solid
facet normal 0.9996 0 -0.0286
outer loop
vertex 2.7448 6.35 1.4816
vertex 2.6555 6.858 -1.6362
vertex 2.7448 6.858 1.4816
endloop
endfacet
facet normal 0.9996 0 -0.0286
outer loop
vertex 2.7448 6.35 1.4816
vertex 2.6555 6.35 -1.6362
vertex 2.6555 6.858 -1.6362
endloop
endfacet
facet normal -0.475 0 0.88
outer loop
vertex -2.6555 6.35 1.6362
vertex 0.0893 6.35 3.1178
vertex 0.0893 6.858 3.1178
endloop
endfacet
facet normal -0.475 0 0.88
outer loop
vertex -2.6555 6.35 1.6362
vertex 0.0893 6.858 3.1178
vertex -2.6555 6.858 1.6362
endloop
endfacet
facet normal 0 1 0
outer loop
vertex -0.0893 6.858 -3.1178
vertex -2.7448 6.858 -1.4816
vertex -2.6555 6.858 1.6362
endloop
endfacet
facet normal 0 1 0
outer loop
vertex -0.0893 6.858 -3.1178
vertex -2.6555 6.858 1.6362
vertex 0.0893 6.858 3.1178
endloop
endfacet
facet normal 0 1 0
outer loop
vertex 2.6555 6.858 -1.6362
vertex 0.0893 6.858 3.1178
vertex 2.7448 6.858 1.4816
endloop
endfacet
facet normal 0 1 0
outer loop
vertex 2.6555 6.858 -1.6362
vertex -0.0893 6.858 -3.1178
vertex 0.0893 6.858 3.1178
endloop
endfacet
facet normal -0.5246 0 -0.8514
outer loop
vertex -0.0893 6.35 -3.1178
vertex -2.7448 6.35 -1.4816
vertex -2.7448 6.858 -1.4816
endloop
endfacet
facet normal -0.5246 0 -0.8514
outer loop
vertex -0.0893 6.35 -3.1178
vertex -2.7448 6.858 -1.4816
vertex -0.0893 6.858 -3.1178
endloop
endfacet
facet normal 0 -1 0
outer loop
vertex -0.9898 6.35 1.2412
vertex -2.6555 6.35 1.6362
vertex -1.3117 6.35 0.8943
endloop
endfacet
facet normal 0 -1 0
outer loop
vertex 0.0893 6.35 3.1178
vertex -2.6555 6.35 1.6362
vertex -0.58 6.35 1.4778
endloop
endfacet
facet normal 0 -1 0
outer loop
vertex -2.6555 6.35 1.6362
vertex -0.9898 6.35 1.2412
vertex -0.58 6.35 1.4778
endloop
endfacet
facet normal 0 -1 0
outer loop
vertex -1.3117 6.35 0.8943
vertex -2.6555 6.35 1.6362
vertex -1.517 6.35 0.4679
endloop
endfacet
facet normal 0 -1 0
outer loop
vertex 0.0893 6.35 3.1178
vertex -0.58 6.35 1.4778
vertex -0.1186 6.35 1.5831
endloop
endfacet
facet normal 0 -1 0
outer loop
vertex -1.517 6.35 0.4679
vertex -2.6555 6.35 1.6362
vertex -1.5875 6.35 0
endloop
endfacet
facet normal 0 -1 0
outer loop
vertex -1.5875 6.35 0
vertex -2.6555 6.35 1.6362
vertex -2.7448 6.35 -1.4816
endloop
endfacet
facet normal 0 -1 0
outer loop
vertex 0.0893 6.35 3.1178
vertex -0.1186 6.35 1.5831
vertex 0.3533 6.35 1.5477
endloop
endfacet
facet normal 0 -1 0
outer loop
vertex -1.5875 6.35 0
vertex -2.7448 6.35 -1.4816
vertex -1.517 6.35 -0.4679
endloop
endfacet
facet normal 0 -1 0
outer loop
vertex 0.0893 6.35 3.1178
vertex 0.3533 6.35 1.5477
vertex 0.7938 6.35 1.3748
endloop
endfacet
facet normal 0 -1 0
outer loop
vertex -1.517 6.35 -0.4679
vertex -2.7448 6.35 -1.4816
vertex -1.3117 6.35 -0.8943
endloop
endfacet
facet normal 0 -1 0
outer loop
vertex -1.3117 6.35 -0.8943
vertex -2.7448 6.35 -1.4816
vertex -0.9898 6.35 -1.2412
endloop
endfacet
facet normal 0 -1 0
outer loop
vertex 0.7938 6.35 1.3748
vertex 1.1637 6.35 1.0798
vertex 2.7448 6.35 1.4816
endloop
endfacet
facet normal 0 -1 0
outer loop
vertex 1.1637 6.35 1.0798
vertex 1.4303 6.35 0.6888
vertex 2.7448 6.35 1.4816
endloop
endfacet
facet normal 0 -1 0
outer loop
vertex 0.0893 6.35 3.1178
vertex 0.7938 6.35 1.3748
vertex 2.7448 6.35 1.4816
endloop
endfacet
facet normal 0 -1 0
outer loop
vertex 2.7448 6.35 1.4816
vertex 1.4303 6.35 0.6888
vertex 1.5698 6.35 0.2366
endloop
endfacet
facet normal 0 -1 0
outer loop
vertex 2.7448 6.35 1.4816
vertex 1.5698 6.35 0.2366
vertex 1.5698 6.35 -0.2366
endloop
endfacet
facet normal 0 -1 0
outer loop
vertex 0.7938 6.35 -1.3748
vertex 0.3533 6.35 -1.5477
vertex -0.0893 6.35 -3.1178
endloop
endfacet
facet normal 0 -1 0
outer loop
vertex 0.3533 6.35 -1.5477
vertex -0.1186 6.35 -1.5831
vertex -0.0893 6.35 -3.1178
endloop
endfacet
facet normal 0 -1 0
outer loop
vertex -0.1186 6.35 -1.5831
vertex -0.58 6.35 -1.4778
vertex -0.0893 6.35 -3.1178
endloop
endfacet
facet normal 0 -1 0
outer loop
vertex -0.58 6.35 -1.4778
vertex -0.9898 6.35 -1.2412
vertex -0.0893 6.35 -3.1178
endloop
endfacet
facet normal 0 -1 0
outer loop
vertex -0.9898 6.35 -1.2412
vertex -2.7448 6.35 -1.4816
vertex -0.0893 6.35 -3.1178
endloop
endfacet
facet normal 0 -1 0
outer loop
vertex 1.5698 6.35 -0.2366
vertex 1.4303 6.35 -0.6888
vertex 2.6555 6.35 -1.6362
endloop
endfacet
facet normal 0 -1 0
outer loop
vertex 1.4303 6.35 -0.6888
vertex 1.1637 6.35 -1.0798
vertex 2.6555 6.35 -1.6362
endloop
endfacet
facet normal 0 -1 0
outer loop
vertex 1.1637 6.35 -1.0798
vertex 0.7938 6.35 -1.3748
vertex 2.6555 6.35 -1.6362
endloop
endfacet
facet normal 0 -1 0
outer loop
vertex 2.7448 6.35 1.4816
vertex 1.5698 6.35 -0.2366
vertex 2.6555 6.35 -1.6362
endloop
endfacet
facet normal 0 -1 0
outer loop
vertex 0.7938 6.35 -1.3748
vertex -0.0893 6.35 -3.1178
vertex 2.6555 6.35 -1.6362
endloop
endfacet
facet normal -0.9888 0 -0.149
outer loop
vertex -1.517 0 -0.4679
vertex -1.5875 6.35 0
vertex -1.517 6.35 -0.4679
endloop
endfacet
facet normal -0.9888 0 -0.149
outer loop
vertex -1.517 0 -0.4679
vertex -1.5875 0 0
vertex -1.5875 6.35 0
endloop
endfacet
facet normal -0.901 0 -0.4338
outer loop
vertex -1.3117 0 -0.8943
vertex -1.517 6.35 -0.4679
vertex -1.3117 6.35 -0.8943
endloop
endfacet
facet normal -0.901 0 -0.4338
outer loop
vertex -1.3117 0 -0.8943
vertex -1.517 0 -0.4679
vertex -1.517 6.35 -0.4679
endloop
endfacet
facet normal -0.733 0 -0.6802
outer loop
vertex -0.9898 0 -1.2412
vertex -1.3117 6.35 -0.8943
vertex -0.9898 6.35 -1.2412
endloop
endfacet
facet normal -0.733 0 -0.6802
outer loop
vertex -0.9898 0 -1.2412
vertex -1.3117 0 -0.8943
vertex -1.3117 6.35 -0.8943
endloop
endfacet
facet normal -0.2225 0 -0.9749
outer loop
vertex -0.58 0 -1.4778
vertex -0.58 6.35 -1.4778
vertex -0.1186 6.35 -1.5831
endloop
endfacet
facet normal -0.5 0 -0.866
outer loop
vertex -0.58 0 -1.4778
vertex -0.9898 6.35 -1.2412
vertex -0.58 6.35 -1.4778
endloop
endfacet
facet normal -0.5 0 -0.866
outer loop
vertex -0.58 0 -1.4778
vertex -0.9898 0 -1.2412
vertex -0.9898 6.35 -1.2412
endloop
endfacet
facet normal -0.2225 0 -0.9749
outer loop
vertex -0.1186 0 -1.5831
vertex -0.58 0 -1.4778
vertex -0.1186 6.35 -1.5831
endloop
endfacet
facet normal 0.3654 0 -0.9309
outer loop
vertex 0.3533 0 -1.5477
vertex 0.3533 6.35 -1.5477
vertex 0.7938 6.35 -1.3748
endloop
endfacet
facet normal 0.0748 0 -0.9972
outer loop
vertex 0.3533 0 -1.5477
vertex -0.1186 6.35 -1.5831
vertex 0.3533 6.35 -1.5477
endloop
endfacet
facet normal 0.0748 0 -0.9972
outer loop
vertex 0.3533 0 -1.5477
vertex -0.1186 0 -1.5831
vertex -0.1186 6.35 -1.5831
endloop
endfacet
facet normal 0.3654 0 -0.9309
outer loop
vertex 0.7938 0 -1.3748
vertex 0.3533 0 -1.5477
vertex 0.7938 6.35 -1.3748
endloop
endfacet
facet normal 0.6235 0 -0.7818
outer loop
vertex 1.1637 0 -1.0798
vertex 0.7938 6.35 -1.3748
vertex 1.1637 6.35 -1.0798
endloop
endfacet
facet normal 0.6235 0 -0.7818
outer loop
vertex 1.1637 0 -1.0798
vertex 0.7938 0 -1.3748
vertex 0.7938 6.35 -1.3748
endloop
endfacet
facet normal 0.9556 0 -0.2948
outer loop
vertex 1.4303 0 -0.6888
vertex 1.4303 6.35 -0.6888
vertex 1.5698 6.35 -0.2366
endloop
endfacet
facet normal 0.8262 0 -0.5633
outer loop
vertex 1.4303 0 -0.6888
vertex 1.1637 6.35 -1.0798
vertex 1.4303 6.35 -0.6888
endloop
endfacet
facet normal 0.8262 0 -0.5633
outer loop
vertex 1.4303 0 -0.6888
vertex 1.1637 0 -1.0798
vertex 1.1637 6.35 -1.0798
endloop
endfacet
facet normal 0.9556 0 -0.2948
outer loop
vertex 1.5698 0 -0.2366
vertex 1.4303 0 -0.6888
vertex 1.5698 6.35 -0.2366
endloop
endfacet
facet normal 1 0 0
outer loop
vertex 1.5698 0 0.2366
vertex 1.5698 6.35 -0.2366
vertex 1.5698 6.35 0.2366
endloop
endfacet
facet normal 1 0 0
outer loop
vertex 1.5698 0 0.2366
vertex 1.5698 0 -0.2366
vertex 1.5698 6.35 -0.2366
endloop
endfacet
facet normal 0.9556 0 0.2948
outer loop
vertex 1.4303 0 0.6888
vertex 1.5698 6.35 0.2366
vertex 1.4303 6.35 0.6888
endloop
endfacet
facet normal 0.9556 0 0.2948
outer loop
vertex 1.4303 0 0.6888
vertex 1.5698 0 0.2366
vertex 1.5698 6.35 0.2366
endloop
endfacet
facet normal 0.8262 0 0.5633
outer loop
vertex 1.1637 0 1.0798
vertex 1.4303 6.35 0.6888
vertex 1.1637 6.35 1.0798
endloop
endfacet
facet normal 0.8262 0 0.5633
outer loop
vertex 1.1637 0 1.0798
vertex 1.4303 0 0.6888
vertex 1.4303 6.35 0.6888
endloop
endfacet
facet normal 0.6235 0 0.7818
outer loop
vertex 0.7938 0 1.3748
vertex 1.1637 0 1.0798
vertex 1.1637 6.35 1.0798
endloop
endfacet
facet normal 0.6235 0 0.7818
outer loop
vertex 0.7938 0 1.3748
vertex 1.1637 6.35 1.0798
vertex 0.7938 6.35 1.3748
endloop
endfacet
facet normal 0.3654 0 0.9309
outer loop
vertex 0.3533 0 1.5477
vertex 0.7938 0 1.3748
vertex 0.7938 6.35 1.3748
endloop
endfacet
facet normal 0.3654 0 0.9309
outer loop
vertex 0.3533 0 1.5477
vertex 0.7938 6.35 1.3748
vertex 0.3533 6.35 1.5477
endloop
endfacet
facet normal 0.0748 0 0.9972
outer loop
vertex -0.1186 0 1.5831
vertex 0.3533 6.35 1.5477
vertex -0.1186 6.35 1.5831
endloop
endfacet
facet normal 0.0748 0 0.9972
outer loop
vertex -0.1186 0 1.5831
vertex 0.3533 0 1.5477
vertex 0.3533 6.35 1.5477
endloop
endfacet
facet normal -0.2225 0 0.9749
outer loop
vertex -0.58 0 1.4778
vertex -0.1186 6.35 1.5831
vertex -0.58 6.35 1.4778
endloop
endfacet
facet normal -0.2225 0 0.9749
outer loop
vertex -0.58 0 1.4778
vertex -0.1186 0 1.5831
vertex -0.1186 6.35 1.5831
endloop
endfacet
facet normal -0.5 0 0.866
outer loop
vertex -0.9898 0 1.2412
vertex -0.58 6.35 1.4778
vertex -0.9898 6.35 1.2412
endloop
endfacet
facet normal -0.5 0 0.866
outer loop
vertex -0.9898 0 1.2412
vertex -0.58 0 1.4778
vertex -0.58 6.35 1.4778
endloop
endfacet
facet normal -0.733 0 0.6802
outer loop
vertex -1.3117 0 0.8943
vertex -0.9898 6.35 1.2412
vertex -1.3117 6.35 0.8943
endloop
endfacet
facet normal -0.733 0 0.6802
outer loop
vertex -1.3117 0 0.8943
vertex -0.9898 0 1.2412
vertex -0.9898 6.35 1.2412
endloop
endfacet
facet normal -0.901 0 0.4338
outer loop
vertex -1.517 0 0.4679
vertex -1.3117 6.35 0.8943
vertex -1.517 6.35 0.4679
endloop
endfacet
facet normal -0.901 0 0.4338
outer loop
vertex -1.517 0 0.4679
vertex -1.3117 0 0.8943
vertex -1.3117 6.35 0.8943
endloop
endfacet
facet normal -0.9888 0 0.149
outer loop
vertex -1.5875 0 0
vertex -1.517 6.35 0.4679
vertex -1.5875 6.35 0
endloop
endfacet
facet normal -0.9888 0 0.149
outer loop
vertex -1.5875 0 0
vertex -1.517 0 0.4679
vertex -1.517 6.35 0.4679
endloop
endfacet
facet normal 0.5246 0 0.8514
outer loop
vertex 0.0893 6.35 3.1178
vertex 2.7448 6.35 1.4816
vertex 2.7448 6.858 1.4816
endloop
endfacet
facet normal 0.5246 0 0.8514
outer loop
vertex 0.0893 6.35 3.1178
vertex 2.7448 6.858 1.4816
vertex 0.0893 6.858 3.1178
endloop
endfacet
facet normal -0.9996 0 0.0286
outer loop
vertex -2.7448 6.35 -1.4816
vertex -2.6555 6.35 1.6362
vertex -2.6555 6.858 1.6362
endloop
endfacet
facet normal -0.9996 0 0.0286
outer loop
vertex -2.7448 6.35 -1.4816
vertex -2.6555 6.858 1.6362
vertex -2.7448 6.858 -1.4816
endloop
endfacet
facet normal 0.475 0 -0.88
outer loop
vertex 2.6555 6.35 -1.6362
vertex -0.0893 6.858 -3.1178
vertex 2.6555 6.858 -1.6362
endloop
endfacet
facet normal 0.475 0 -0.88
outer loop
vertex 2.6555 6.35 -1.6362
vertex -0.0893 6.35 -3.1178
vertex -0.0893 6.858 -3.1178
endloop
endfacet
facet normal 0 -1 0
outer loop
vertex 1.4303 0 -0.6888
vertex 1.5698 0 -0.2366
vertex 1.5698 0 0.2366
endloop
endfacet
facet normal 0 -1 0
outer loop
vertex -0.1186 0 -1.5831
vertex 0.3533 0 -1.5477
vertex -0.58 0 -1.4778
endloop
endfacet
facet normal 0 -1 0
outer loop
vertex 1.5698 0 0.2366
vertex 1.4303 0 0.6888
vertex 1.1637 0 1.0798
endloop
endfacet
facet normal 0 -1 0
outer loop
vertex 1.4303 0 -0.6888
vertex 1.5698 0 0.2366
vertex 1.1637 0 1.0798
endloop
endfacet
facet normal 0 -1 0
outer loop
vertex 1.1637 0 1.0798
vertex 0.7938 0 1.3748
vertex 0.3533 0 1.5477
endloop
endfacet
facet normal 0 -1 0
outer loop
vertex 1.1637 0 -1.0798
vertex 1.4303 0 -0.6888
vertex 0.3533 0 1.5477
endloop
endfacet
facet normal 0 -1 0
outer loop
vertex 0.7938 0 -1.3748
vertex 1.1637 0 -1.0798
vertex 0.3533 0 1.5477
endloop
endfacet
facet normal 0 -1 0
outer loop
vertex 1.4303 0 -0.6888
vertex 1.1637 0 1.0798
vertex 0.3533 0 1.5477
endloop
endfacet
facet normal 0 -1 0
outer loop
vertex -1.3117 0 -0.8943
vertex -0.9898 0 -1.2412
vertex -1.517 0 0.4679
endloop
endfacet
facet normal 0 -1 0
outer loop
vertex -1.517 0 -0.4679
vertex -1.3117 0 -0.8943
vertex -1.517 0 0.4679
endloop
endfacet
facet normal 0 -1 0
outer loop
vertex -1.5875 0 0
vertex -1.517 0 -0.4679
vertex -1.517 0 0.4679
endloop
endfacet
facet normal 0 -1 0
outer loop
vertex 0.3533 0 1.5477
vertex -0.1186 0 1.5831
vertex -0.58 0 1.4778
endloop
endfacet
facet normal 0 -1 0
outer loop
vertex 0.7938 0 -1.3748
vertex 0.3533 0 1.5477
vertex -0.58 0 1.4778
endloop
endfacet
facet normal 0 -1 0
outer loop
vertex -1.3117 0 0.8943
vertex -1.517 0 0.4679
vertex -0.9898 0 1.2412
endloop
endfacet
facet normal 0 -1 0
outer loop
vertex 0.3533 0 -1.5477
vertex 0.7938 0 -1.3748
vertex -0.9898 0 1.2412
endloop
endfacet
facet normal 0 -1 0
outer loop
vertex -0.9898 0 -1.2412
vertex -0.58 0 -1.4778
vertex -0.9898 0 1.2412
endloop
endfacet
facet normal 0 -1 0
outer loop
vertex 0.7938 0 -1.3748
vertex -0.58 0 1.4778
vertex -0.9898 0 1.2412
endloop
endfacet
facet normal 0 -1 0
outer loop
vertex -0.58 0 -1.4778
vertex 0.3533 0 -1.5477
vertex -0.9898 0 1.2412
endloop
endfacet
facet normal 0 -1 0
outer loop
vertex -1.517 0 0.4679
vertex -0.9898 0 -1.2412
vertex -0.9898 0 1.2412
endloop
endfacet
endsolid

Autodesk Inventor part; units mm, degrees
ref_plane "YZ Plane" through (0, 0, 0) normal (1, 0, 0) x (0, 1, 0)
ref_plane "XZ Plane" through (0, 0, 0) normal (0, 1, 0) x (-1, 0, 0)
ref_plane "XY Plane" through (0, 0, 0) normal (0, 0, 1) x (1, 0, 0)
sketch "Sketch1" plane through (0, 0, 0) normal (0, 1, 0) x (-1, 0, 0)
  circle A0 centre (0, 0) radius 6.35
  circle A1 centre (0, 0) radius 1.5875
  dimension "d0" = 12.7
  dimension "d1" = 3.175
extrude "Extrusion1" add sketch "Sketch1" along normal blind 6.35 contours A1
thread "Thread1" size "5-40 UNC" class "2A" standard "ANSI Unified Screw Threads" full length
sketch "Sketch3" plane through (0, 6.35, 0) normal (0, 1, 0) x (1, 0, 0)
  line L0 (-2.6555, -1.6362) -> (-2.7448, 1.4816)
  line L1 (-2.7448, 1.4816) -> (-0.0893, 3.1178)
  line L2 (-0.0893, 3.1178) -> (2.6555, 1.6362)
  line L3 (2.6555, 1.6362) -> (2.7448, -1.4816)
  line L4 (2.7448, -1.4816) -> (0.0893, -3.1178)
  line L5 (0.0893, -3.1178) -> (-2.6555, -1.6362)
  point P0 (0, 0)
  point P1 (0, 0)
extrude "Extrusion3" add sketch "Sketch3" along normal blind 0.508
properties part number ".125bolt"
